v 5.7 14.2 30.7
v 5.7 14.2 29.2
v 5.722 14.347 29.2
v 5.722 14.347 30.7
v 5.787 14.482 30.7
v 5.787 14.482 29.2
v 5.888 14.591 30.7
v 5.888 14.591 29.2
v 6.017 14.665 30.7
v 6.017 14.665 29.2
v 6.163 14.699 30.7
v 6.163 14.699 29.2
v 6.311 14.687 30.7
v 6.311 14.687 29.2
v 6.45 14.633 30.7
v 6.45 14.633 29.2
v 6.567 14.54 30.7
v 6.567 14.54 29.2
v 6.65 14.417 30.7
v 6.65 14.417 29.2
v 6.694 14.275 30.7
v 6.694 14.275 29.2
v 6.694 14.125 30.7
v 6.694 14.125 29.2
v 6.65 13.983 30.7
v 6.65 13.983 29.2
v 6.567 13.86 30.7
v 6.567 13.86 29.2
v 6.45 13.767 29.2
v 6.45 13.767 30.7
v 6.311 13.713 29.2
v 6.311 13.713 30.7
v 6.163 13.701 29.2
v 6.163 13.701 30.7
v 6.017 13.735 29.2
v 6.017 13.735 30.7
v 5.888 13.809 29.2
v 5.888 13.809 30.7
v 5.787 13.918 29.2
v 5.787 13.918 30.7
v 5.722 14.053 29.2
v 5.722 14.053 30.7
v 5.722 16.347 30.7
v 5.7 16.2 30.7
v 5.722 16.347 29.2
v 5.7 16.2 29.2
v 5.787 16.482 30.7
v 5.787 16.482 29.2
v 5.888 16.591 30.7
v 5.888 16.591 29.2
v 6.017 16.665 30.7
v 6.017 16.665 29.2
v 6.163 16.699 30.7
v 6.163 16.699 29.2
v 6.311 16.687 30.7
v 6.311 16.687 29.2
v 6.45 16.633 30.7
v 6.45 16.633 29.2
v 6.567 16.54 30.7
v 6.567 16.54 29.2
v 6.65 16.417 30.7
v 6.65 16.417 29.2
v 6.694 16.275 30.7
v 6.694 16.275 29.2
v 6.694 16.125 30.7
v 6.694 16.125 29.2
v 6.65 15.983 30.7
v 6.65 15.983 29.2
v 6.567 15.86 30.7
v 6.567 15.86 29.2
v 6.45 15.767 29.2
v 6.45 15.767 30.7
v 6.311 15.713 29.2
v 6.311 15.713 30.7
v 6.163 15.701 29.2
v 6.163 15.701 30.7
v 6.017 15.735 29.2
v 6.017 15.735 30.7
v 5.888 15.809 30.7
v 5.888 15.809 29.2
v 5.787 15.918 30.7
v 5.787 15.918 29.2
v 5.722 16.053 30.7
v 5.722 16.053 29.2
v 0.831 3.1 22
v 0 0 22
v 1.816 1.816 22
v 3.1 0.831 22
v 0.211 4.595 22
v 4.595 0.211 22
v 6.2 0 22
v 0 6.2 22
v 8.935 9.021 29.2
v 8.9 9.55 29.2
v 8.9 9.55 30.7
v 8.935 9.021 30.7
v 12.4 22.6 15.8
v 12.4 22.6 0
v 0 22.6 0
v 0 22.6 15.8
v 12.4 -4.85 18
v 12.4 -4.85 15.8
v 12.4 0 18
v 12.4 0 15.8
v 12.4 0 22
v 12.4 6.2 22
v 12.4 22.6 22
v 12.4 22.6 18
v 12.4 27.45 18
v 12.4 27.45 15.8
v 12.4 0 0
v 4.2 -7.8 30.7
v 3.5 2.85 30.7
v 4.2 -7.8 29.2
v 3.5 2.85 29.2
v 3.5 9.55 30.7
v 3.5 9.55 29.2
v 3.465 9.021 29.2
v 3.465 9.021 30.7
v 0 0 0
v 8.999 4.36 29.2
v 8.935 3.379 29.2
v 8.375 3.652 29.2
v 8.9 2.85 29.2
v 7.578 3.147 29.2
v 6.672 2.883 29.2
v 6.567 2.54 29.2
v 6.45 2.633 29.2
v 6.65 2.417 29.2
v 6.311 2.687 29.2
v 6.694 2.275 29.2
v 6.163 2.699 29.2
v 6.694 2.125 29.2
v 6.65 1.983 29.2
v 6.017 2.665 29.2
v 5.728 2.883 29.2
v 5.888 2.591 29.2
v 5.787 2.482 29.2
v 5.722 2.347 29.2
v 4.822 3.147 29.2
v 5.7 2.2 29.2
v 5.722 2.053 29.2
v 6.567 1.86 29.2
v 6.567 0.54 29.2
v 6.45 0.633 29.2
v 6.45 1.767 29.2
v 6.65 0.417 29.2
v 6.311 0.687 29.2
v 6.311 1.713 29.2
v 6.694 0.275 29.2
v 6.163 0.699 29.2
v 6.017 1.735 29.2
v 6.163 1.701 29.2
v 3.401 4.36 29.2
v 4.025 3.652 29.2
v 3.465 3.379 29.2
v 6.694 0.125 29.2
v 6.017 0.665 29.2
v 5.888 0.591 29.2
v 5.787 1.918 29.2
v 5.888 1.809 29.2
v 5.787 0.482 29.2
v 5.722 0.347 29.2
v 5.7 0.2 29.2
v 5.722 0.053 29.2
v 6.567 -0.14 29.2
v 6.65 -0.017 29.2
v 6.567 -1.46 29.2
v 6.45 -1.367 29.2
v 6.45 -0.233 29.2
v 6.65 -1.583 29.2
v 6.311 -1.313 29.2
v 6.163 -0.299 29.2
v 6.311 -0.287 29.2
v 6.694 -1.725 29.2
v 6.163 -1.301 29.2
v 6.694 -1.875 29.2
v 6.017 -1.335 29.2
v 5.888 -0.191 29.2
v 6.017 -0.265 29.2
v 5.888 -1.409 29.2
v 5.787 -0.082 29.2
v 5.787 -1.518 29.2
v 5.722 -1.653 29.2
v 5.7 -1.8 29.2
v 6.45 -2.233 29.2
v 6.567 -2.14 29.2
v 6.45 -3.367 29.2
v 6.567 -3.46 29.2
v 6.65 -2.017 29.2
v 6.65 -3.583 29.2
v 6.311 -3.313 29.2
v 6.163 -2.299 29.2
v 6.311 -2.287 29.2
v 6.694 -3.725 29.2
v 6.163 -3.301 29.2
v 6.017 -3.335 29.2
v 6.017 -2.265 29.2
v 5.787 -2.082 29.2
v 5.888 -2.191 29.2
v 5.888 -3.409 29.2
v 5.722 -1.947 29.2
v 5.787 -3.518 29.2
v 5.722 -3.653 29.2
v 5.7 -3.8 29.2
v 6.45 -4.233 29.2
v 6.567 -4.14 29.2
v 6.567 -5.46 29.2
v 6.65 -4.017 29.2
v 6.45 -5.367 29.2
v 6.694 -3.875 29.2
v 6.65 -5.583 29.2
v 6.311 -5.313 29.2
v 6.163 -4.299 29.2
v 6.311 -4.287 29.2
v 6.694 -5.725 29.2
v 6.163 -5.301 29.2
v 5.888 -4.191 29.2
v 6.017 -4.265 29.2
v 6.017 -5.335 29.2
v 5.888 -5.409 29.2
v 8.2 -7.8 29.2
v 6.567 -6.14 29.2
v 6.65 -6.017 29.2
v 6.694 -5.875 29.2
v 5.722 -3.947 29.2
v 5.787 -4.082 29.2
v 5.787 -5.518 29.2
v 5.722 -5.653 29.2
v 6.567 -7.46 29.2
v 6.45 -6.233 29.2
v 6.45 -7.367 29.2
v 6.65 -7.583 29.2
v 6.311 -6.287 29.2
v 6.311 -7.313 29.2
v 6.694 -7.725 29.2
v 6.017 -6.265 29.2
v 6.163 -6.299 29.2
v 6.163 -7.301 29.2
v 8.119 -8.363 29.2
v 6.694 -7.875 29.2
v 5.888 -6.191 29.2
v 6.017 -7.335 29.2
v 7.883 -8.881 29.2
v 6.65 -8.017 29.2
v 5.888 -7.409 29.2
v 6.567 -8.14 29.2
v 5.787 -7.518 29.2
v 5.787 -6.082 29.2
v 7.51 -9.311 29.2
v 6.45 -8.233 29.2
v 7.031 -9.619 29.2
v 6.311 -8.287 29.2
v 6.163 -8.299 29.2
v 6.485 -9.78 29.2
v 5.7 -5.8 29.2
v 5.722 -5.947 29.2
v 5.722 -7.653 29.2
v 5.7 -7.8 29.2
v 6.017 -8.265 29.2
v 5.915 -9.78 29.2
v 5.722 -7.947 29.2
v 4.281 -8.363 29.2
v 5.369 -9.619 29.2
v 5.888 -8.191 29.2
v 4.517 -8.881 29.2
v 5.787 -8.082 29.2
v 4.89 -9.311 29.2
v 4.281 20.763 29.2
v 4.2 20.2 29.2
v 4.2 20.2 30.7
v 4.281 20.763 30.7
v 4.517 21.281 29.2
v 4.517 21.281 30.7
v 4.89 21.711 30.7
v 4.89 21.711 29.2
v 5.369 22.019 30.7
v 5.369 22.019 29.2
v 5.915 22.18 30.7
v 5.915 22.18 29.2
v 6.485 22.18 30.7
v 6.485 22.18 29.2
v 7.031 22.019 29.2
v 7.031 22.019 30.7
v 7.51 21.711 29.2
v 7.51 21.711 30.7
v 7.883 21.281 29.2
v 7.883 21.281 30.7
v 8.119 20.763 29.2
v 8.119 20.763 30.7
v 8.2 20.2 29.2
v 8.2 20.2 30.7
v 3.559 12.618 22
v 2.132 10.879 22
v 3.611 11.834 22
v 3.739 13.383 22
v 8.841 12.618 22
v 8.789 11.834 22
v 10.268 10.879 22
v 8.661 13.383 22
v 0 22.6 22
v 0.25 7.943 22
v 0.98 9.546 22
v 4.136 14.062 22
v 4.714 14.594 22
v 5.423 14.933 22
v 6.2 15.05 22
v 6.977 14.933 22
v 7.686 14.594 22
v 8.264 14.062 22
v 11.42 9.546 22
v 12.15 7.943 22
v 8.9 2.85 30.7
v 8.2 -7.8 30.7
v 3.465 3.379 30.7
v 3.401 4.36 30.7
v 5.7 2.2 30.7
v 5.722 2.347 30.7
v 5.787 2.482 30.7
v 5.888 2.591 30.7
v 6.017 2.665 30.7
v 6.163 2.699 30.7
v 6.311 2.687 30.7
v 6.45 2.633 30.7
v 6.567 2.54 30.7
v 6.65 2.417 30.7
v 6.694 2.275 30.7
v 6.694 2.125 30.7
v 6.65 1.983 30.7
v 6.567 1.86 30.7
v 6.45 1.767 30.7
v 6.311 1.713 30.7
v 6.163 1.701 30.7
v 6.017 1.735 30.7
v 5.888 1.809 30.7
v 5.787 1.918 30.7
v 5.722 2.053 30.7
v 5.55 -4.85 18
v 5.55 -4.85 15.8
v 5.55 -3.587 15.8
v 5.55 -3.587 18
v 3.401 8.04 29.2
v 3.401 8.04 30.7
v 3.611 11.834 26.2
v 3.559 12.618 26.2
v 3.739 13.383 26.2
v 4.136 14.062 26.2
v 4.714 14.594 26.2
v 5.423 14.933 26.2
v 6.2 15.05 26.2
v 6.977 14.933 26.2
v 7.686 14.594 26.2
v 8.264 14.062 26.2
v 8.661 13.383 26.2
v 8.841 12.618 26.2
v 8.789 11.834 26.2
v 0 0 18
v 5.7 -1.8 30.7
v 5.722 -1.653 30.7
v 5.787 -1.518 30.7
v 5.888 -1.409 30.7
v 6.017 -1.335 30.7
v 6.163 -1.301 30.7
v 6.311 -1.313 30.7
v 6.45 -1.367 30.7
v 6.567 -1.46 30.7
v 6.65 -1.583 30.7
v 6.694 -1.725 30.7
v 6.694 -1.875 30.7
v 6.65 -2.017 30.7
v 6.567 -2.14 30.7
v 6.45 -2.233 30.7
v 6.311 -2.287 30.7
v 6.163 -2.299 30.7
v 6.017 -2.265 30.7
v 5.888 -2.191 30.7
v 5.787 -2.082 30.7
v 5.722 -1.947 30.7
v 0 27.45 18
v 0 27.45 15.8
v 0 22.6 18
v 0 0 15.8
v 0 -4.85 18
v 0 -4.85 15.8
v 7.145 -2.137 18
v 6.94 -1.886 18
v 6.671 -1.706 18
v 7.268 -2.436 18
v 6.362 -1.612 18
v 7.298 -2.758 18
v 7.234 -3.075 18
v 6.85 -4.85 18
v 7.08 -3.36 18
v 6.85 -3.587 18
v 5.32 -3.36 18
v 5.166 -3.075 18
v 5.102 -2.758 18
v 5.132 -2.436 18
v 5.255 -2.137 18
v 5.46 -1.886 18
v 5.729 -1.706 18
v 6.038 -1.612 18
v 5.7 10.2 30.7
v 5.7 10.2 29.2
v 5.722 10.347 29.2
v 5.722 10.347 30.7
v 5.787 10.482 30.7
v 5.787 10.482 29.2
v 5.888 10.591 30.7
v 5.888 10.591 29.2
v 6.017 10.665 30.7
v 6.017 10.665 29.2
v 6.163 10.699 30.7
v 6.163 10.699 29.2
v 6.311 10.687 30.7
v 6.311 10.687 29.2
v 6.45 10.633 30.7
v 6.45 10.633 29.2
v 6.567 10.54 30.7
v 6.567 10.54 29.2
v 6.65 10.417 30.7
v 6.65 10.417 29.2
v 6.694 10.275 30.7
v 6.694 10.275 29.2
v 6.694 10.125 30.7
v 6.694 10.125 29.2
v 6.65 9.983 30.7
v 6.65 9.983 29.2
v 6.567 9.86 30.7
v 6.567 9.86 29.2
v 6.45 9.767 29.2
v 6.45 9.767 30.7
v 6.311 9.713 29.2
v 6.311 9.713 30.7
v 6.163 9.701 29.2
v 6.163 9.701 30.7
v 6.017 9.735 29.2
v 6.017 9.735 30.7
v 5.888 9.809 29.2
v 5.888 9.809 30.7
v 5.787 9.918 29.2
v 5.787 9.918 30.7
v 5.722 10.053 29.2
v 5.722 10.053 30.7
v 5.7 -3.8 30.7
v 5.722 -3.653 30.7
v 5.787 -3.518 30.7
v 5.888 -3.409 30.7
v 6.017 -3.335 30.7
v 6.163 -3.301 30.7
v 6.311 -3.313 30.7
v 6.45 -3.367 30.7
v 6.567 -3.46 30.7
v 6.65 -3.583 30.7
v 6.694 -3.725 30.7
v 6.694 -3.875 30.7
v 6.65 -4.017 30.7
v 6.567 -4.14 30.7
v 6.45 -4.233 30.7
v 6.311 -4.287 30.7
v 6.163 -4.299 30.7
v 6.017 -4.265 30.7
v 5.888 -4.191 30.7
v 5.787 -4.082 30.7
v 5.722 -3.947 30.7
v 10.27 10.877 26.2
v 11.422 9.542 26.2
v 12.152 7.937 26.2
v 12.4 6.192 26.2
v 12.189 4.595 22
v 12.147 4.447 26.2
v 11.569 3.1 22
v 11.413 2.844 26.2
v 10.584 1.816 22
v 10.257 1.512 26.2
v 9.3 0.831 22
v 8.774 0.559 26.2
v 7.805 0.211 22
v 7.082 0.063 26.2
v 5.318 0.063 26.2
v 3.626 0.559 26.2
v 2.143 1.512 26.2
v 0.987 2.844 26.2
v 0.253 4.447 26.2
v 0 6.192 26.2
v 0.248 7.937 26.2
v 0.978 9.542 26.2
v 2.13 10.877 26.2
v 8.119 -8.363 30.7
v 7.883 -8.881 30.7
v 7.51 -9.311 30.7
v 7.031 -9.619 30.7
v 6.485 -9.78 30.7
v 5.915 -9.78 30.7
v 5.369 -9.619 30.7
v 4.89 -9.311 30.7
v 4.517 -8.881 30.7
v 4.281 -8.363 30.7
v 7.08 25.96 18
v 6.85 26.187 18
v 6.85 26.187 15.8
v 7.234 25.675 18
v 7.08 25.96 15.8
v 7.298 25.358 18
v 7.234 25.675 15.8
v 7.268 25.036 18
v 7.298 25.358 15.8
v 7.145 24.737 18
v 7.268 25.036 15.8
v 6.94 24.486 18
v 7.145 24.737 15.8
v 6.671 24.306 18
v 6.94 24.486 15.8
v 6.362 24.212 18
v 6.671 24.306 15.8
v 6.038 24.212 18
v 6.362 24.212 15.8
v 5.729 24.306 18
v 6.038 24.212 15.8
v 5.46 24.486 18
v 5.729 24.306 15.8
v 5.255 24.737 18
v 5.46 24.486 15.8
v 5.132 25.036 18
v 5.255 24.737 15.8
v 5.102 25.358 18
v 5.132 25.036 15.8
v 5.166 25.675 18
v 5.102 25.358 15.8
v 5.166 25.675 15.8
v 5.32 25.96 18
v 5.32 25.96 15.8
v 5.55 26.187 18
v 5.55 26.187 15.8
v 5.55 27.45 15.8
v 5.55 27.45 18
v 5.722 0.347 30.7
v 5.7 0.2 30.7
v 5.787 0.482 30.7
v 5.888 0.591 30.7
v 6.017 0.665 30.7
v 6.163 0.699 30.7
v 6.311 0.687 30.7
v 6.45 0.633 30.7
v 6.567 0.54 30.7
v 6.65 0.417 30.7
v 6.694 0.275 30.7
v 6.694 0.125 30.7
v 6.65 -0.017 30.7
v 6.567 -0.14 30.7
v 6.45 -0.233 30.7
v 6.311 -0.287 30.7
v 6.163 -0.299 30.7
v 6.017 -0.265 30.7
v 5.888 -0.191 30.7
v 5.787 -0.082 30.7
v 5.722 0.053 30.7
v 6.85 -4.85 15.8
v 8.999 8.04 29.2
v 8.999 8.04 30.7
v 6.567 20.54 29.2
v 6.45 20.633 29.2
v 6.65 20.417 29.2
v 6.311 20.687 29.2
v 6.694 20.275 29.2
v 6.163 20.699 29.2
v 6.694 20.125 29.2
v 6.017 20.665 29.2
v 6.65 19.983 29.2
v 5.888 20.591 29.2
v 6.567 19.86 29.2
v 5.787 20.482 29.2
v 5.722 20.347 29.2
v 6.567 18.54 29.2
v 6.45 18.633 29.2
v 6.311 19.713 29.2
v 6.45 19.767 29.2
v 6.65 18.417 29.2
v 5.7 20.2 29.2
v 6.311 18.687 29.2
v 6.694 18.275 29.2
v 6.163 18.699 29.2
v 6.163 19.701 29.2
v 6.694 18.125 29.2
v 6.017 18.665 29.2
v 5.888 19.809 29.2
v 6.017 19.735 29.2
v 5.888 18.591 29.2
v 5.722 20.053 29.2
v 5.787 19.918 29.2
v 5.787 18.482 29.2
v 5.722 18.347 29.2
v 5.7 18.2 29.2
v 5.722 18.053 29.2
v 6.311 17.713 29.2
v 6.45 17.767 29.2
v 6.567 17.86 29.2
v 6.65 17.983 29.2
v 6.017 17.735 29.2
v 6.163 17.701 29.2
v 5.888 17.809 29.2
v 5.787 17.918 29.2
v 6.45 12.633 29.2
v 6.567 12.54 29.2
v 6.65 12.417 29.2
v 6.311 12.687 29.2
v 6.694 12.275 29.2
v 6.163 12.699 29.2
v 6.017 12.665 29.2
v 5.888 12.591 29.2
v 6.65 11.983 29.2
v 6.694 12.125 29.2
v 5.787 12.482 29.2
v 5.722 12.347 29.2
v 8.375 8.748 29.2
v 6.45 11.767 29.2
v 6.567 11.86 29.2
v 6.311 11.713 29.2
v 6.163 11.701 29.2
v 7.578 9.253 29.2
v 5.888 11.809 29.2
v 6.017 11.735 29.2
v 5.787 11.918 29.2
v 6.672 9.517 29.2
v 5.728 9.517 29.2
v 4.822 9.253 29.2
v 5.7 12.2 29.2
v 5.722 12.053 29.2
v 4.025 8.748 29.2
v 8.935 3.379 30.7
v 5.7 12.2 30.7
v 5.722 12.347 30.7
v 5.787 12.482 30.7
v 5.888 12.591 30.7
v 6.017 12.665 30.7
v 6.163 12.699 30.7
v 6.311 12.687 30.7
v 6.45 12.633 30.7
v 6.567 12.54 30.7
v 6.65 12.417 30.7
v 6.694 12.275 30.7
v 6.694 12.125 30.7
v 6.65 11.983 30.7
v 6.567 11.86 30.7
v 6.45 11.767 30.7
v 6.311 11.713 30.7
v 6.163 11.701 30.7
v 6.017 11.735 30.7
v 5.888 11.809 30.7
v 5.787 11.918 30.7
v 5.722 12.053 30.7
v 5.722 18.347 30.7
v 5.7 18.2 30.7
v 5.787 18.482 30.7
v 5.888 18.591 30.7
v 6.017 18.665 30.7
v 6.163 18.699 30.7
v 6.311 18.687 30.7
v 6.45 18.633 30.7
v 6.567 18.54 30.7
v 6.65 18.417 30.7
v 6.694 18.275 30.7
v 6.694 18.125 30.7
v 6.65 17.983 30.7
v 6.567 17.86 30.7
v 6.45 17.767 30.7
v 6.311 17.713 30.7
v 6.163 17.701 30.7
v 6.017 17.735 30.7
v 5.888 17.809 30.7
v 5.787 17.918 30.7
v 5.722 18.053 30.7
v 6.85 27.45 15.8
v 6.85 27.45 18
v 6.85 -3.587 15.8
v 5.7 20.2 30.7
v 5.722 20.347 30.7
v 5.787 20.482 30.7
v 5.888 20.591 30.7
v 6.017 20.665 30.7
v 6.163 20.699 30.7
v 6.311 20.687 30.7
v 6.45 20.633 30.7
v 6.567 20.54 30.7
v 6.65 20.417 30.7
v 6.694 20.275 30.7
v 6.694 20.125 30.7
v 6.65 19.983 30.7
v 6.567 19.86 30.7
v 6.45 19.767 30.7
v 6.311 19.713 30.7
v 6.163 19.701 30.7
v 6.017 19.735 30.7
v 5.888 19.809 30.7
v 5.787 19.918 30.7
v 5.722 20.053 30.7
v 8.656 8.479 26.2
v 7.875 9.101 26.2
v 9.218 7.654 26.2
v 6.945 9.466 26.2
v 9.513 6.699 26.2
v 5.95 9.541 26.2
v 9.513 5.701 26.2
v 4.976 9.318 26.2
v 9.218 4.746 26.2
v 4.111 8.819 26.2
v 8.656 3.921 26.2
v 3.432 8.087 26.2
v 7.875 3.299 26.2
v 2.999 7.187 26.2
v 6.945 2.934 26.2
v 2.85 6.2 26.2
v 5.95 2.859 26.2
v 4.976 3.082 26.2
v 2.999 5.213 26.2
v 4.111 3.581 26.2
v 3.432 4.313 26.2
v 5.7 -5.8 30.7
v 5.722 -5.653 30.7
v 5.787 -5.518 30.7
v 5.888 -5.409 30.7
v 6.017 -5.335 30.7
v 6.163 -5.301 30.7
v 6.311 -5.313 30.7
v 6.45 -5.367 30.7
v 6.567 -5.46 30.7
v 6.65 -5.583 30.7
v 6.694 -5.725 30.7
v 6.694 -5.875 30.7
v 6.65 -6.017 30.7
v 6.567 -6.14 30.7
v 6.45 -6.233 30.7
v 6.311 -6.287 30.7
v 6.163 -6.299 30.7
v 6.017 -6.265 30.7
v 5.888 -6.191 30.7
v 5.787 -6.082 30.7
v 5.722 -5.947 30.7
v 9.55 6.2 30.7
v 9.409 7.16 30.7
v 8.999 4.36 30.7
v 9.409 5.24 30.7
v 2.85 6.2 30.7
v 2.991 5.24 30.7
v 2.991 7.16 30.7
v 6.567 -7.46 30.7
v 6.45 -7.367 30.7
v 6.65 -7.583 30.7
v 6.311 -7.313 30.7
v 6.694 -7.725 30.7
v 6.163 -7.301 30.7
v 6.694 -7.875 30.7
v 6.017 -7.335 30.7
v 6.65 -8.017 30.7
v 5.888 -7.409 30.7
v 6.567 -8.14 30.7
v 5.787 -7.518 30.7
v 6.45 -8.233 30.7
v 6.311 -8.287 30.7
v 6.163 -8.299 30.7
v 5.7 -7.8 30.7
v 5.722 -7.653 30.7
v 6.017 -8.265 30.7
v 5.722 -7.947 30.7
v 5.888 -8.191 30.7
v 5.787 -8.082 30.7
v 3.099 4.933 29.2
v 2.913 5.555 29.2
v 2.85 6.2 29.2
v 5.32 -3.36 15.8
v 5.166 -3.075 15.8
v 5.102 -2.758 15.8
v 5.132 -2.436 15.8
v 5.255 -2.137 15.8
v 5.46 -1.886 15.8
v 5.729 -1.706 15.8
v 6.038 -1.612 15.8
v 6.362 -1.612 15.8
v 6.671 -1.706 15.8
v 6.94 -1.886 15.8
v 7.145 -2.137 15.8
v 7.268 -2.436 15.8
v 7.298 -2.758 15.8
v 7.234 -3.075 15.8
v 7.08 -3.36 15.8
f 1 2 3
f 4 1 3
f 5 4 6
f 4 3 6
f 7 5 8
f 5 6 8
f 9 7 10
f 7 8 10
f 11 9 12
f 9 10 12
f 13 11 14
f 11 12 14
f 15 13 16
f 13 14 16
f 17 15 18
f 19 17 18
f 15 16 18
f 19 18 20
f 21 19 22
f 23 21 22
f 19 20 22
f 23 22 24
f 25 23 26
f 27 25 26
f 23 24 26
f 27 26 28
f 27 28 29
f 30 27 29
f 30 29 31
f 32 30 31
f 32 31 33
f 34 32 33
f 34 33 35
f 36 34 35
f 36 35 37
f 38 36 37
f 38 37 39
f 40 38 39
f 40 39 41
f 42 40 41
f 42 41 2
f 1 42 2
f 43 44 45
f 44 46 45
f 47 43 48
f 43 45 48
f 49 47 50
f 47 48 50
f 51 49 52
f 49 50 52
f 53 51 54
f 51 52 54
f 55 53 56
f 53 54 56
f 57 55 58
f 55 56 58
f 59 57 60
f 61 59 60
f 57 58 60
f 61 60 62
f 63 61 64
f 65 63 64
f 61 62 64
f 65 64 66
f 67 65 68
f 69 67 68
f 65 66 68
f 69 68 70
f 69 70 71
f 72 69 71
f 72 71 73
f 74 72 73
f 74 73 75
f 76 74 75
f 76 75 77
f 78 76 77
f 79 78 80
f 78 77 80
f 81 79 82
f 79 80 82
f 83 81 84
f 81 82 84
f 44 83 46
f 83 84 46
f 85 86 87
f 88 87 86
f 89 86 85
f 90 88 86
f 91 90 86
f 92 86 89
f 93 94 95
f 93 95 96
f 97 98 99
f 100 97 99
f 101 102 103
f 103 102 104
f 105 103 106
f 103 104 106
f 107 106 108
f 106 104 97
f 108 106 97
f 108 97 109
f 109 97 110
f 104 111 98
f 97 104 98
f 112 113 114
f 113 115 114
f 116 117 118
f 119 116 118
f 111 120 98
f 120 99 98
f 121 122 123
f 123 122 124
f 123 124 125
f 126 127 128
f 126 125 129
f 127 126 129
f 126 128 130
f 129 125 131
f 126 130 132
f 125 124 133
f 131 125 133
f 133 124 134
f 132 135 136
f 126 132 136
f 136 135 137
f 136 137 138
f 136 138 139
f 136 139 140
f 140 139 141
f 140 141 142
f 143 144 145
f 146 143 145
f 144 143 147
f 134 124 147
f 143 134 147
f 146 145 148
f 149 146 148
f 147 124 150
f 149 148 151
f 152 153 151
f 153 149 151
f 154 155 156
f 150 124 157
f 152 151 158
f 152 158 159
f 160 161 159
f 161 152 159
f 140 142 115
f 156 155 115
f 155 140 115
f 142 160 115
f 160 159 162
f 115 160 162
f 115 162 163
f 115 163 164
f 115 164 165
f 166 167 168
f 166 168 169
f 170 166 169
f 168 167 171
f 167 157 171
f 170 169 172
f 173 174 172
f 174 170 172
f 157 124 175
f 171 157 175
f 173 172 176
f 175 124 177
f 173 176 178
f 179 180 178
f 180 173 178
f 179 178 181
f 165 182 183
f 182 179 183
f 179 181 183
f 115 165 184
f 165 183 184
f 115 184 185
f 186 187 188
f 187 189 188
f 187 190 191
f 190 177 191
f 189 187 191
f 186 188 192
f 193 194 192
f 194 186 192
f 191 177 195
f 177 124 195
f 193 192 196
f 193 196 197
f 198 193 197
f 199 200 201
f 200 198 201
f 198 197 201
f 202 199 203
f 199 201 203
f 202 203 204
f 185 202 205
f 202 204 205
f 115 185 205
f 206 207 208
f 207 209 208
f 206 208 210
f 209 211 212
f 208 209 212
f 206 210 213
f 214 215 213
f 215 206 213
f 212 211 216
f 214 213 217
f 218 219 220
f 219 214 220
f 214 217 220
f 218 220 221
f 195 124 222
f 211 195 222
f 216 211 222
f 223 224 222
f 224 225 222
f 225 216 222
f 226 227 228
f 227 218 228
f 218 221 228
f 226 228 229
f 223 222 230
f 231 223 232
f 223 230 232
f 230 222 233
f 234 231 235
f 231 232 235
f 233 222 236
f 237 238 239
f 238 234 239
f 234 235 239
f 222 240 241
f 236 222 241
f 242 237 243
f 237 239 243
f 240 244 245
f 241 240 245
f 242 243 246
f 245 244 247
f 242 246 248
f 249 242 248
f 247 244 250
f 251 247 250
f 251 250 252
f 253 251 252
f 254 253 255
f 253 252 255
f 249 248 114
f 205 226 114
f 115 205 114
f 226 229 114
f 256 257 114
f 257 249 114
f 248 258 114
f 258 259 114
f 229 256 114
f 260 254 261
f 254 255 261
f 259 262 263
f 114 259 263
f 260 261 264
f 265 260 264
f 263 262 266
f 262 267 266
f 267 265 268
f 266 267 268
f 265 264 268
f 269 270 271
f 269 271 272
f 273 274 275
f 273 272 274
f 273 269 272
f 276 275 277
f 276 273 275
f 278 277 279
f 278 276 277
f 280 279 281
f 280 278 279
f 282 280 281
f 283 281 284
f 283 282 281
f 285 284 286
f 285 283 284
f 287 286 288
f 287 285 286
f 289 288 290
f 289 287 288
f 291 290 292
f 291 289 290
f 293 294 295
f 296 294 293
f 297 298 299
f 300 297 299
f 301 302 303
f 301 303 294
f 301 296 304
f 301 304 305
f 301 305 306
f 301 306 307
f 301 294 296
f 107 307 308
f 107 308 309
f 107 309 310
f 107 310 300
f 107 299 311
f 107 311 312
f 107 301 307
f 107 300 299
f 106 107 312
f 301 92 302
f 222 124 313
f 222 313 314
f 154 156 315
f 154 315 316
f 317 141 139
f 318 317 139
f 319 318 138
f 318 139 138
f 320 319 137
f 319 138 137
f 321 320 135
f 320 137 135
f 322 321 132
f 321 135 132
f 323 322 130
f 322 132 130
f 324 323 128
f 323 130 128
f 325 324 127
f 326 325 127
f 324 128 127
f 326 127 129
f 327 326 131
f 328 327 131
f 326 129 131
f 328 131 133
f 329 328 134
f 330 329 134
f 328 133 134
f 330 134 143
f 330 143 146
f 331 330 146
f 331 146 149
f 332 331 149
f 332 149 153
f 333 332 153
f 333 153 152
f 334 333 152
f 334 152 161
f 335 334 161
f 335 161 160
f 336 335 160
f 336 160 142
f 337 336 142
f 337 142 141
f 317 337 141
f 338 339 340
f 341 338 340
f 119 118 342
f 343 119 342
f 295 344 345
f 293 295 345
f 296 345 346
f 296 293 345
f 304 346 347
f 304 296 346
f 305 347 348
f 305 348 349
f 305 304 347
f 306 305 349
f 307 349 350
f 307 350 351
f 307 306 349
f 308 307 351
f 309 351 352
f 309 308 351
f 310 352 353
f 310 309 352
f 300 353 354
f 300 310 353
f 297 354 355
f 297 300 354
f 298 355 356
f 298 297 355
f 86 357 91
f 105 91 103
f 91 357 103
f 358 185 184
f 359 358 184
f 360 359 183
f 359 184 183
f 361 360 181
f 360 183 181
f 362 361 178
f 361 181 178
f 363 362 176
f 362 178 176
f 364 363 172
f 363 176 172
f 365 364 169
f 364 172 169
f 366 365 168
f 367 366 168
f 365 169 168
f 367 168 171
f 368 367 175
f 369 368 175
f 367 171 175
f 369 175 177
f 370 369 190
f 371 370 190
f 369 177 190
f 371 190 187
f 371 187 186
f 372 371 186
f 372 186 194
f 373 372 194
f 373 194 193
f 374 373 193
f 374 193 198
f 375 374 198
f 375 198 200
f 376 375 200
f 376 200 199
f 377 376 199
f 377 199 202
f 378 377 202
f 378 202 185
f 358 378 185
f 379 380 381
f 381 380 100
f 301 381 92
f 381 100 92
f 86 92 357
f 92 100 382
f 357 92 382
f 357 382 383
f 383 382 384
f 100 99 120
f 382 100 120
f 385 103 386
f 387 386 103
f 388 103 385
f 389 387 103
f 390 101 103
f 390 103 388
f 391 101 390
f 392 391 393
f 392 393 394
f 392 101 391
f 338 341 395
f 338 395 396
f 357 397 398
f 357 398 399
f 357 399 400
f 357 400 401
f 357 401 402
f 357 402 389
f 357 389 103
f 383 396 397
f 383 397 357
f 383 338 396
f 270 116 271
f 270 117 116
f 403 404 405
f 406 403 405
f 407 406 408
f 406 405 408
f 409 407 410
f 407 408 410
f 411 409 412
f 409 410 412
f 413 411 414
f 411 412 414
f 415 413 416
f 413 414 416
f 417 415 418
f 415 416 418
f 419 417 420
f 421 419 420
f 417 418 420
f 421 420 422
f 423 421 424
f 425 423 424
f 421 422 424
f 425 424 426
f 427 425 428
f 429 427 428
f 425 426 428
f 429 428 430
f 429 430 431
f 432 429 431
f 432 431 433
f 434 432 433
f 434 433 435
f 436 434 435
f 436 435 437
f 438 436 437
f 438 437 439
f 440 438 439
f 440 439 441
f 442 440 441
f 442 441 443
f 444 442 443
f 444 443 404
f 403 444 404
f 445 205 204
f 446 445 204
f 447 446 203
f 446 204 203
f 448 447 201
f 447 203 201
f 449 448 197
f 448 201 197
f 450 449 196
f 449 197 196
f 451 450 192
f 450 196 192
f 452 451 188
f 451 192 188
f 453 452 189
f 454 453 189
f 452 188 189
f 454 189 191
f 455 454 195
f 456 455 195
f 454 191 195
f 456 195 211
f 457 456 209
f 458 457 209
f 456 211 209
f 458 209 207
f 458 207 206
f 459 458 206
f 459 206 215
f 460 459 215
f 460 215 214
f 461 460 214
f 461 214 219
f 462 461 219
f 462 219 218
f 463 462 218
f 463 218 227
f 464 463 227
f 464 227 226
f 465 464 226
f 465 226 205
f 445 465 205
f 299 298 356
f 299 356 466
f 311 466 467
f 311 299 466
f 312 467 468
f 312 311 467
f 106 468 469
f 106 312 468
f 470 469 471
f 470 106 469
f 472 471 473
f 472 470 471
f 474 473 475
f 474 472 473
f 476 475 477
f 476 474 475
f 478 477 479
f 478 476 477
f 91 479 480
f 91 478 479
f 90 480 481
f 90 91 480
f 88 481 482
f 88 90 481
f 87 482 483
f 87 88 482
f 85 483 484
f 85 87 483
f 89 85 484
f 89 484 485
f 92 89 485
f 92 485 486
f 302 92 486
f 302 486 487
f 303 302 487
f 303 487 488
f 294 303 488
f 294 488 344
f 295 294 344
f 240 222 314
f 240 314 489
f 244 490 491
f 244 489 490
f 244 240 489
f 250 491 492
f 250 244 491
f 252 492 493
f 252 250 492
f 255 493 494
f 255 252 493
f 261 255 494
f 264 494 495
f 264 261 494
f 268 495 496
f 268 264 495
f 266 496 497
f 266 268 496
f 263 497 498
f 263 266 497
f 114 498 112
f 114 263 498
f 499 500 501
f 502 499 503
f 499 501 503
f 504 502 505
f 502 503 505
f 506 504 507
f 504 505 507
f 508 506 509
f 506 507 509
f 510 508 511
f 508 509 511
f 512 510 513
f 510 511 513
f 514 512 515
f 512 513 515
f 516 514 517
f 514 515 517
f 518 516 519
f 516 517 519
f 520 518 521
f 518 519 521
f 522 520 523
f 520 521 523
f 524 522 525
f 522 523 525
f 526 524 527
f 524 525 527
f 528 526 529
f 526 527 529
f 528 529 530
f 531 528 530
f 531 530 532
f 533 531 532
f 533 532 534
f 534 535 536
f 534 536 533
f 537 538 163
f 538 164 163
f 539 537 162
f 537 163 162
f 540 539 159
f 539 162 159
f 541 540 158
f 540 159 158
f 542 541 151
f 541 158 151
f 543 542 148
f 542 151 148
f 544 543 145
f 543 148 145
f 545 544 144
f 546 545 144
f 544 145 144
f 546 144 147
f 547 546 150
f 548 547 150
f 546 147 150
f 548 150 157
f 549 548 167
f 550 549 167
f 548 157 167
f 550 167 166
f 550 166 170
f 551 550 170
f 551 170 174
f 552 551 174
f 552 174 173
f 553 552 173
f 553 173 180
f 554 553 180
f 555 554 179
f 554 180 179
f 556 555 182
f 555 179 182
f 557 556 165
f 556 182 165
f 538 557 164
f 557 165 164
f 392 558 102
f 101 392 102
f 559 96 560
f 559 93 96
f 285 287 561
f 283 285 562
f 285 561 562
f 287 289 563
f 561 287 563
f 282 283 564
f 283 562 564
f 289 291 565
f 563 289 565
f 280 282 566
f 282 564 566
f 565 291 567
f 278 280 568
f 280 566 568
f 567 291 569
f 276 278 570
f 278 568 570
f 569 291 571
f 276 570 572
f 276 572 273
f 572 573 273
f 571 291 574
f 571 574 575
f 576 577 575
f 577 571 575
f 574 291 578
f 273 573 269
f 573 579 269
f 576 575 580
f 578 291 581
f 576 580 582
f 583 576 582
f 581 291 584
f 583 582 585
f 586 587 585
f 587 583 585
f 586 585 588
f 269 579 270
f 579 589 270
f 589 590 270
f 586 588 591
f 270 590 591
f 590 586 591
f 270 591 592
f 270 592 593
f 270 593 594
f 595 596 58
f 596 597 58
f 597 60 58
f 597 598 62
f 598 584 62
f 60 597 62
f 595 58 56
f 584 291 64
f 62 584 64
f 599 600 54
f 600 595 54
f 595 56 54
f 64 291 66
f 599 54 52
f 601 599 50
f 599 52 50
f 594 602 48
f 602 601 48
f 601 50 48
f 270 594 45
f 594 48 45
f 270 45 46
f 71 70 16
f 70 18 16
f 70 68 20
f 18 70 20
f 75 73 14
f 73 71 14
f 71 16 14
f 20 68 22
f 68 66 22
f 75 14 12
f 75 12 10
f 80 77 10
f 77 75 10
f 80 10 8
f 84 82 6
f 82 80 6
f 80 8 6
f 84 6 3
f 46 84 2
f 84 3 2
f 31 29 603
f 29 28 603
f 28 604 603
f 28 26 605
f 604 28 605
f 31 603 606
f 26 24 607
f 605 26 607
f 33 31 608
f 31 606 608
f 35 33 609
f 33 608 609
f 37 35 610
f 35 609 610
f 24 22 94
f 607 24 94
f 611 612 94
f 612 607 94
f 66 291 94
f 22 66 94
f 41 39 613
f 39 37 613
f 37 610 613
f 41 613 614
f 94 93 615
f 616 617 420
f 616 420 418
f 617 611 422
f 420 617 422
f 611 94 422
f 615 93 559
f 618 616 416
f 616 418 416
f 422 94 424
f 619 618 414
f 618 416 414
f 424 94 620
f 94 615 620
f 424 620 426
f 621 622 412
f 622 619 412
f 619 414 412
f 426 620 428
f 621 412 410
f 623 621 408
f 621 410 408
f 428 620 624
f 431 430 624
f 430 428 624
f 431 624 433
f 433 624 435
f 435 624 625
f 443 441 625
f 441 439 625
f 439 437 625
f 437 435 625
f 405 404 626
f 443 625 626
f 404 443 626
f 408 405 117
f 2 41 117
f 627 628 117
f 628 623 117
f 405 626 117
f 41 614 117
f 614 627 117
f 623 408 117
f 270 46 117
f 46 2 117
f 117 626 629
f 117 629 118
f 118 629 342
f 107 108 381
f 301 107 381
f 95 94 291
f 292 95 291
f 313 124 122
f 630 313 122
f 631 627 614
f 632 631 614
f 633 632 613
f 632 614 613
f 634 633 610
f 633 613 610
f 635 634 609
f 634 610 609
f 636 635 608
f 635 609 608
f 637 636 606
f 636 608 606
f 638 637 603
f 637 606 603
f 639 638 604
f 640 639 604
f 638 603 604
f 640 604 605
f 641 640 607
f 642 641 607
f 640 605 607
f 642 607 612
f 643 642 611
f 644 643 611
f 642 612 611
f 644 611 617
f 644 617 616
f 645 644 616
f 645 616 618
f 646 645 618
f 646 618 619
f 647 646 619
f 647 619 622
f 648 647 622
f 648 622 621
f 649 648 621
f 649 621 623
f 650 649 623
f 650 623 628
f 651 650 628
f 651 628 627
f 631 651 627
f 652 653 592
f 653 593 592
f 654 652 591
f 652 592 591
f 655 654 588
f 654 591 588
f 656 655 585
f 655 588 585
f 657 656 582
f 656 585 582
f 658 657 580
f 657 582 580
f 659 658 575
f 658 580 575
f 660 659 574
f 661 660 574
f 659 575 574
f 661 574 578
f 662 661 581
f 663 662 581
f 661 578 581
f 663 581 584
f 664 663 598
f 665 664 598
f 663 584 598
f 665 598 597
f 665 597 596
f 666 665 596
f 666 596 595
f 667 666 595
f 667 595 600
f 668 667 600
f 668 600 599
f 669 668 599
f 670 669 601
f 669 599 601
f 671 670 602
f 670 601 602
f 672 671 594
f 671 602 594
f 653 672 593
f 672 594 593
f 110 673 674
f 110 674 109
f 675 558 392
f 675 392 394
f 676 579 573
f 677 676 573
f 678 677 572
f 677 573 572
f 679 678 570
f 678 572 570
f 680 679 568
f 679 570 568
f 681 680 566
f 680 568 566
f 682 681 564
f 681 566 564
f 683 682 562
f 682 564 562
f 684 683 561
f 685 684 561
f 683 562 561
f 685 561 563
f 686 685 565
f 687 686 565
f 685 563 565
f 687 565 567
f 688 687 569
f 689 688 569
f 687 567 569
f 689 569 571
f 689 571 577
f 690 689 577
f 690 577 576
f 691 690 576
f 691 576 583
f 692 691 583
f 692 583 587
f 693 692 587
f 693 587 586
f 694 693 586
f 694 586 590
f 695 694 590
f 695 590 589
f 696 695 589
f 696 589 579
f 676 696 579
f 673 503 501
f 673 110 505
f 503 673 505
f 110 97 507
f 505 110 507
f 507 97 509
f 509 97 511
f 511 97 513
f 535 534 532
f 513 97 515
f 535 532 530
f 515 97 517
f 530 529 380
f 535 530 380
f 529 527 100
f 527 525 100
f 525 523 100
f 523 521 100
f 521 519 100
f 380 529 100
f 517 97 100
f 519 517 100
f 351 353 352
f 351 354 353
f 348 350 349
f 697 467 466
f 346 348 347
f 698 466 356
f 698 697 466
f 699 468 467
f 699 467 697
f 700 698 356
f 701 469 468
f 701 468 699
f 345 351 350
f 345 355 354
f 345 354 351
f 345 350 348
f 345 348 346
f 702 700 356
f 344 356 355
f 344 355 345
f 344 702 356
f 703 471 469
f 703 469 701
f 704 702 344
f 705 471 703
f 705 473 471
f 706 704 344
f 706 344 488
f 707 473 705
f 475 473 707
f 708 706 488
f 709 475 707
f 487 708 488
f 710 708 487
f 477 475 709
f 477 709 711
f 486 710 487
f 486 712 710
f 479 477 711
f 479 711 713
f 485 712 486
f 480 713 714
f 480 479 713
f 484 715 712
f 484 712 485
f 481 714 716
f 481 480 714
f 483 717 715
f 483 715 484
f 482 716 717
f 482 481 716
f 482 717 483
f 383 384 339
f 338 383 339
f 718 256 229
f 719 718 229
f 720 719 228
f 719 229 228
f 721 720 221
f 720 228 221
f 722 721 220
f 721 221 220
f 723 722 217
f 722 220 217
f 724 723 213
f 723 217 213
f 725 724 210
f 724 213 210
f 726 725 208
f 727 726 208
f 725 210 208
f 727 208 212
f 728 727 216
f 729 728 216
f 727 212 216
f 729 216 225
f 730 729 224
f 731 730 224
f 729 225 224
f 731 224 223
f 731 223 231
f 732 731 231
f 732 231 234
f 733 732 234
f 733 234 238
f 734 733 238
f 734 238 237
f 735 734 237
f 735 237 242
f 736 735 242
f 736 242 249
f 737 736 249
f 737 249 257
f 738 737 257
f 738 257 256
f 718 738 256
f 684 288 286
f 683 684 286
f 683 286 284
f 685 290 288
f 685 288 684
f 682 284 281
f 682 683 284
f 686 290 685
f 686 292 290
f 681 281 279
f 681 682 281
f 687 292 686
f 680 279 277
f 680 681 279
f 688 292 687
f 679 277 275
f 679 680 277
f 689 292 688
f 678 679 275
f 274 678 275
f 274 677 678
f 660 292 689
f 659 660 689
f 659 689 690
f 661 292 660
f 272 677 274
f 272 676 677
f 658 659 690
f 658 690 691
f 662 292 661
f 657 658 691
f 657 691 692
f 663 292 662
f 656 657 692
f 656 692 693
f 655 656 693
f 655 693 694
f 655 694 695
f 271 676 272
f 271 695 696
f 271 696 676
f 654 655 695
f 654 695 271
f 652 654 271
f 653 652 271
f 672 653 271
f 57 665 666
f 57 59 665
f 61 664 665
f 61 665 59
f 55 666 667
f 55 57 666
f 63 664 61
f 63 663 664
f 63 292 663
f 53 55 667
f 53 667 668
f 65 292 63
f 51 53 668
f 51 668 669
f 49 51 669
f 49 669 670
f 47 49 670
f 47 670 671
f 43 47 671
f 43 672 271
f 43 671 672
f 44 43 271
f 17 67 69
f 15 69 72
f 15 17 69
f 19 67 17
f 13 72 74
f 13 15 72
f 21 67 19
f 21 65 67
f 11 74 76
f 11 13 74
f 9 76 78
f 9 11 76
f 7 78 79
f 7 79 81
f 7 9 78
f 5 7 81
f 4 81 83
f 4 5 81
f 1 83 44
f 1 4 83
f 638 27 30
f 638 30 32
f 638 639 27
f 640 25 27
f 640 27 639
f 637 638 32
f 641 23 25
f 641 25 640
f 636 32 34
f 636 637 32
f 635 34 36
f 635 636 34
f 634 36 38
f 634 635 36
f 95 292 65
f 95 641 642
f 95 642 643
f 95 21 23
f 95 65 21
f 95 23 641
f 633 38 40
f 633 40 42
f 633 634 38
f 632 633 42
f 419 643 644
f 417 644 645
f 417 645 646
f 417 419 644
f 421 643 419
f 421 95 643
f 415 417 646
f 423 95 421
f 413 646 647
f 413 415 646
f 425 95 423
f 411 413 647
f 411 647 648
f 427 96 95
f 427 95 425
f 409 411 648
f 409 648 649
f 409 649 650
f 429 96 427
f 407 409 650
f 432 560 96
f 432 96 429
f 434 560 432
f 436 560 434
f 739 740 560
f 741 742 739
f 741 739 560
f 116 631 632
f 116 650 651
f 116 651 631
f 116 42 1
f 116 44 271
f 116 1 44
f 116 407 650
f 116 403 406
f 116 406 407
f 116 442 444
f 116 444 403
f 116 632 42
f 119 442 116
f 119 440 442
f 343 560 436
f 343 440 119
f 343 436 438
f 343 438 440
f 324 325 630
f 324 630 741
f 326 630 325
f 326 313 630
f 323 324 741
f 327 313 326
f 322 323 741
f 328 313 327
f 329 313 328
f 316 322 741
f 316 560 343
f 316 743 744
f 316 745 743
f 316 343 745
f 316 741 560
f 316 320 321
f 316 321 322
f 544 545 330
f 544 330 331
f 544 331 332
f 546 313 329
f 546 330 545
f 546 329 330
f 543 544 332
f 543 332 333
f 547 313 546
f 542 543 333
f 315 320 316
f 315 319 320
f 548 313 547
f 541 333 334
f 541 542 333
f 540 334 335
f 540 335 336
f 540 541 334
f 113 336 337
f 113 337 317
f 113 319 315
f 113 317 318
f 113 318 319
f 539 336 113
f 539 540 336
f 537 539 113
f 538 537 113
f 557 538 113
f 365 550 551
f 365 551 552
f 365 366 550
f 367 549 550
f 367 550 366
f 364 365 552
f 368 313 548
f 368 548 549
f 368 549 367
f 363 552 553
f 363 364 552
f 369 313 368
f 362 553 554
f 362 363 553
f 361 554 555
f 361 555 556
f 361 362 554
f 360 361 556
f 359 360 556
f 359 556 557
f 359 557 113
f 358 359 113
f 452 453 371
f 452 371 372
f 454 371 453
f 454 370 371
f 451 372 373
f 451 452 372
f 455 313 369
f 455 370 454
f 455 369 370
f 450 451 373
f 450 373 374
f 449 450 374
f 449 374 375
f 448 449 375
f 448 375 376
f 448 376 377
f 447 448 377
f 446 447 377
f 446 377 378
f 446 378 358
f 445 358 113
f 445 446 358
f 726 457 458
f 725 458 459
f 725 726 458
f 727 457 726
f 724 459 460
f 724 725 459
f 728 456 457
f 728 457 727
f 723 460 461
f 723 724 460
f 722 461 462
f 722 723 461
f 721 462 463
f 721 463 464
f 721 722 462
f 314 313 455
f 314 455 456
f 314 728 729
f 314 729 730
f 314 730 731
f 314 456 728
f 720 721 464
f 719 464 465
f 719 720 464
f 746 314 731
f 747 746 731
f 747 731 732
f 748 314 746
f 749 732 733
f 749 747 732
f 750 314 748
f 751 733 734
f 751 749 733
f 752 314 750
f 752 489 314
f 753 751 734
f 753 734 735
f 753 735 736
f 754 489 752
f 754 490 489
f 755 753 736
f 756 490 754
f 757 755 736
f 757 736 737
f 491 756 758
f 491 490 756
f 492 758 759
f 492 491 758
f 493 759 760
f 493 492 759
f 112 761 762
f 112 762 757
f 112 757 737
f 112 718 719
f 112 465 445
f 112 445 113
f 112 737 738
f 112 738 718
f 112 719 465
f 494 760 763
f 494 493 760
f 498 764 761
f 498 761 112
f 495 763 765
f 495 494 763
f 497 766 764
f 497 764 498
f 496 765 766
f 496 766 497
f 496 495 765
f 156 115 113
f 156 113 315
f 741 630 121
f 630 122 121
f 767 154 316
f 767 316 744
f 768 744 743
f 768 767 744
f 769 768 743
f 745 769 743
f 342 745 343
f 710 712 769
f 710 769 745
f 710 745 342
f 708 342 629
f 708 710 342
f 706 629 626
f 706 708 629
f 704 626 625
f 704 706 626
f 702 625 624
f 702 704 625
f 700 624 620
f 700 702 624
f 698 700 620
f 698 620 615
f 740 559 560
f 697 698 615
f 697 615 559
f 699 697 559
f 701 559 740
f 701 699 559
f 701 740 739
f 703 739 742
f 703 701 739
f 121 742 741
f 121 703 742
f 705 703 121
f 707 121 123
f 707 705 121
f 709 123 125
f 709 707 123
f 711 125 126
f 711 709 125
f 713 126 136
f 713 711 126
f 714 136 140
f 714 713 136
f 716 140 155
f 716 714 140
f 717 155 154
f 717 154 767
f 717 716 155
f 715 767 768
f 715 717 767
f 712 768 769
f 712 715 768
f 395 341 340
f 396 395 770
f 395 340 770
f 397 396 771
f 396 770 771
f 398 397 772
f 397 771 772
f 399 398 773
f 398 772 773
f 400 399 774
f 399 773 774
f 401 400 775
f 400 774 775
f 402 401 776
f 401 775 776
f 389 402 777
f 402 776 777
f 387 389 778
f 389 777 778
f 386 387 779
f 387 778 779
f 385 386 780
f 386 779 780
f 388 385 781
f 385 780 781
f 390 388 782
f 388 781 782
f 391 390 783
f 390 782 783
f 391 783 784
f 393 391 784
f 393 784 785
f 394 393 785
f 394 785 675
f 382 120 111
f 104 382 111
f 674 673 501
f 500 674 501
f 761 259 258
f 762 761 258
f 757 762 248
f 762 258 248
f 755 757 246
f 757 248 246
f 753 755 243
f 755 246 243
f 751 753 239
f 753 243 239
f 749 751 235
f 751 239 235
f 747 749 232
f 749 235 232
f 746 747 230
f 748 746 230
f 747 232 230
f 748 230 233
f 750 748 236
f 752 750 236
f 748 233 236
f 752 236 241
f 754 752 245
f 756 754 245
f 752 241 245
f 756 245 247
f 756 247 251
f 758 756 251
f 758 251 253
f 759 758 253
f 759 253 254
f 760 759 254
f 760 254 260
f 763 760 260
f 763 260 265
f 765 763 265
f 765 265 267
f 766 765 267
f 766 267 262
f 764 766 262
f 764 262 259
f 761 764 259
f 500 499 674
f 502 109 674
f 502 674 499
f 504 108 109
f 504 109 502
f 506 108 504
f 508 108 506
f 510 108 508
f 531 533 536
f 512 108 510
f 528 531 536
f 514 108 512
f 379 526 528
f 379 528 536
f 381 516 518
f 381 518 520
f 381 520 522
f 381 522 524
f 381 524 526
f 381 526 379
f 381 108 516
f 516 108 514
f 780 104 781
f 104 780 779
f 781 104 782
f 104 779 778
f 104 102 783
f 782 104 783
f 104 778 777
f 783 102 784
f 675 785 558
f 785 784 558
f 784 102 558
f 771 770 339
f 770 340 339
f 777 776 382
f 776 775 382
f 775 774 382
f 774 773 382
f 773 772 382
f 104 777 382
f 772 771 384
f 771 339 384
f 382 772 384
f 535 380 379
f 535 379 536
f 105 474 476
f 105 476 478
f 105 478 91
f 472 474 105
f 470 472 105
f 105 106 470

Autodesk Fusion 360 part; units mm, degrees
sketch "Szkic1" plane through (0, 0, 0) normal (0, 0, 1) x (1, 0, 0)
  line L0 (0, 0) -> (12.4, 0)
  line L1 (12.4, 0) -> (12.4, 22.6)
  line L2 (12.4, 22.6) -> (0, 22.6)
  line L3 (0, 22.6) -> (0, 0)
  dimension "d1" = 12.4
  dimension "d2" = 22.6
extrude "Wyciągnięcie proste1" add sketch "Szkic1" along normal blind 15.8
sketch "Szkic2" plane through (0, 0, 15.8) normal (0, 0, 1) x (-1, 0, 0)
  line L0 (0, -22.6) -> (0, 0)
  line L1 (0, 0) -> (-12.4, 0)
  line L2 (-12.4, 0) -> (-12.4, -22.6)
  line L3 (-12.4, -22.6) -> (0, -22.6)
  line L4 (0, 0) -> (0, 4.85)
  line L5 (0, 0) -> (0, -11.3)
  line L6 (0, -11.3) -> (-12.4, -11.3)
  line L7 (0, 4.85) -> (-12.4, 4.85)
  line L8 (-12.4, 4.85) -> (-12.4, 0)
  line L9 (0, 0) -> (-6.2, 0)
  line L10 (-6.2, 0) -> (-6.2, 2.7)
  circle A0 centre (-6.2, 2.7) radius 1.1
  line L11 (-6.2, 2.7) -> (-6.2, 4.85)
  line L12 (-6.2, 4.85) -> (-6.85, 4.85)
  line L13 (-6.85, 4.85) -> (-6.85, 3.5874)
  line L14 (-5.55, 4.85) -> (-5.55, 3.5874)
  line L15 (-6.2, -27.45) -> (-6.85, -27.45)
  line L16 (-6.2, -22.6) -> (-6.2, -25.3)
  line L17 (0, -22.6) -> (0, -27.45)
  line L18 (-12.4, -27.45) -> (-12.4, -22.6)
  line L19 (-6.2, -25.3) -> (-6.2, -27.45)
  line L20 (-6.85, -27.45) -> (-6.85, -26.1874)
  line L21 (0, -27.45) -> (-12.4, -27.45)
  line L22 (-5.55, -27.45) -> (-5.55, -26.1874)
  line L23 (0, -22.6) -> (-6.2, -22.6)
  line L24 (0, 0) -> (0, -22.6)
  circle A1 centre (-6.2, -25.3) radius 1.1
  line L25 (0, -22.6) -> (-12.4, -22.6)
  line L26 (-12.4, -22.6) -> (-12.4, 0)
  line L27 (0, -22.6) -> (0, -11.3)
  point P0 (0, -22.6)
  dimension "d5" = 4.85
  dimension "d6" = 2.7
  dimension "d7" = 2.2
  dimension "d8" = 0.65
extrude "Wyciągnięcie proste2" add sketch "Szkic2" along normal blind 2.2 contours L0 L2 L3 L6 L23 L24 L25 L26 L27 | L3 L16 L17 L21 L22 L23 A1 L25 | L0 L1 L2 L5 L6 L9 L24 L26 | L3 L16 L18 L20 L21 A1 L25 | L1 L4 L7 L9 L10 A0 L14 | L1 L7 L8 L10 A0 L13
extrude "Wyciągnięcie proste3" add sketch "Szkic1" along normal blind 22
sketch "Szkic3" plane through (0, 0, 22) normal (0, 0, 1) x (-1, 0, 0)
  line L0 (0, -22.6) -> (0, 0)
  line L1 (0, 0) -> (-12.4, 0)
  line L2 (-12.4, 0) -> (-12.4, -22.6)
  line L3 (-12.4, -22.6) -> (0, -22.6)
  line L4 (-12.4, 0) -> (-12.4, -12.4)
  line L5 (-12.4, -12.4) -> (-12.4, -12)
  line L6 (0, 0) -> (-1, -1)
  line L7 (-12.4, 0) -> (-12.4, -11.3)
  line L8 (-12.4, -12.4) -> (-8.85, -12.4)
  line L9 (-3.55, -12.4) -> (0, -12.4)
  arc A0 (-3.6112, -11.8337) -> (-8.7888, -11.8337) centre (-6.2, -6.2) ccw
  arc A1 (-8.7888, -11.8337) -> (-3.6112, -11.8337) centre (-6.2, -12.4) ccw
  line L10 (-1, -1) -> (-1.8159, -1.8159)
  line L11 (-10.5841, -10.5841) -> (-12.4, -12.4)
  line L12 (0, -12.4) -> (-1.8159, -10.5841)
  line L13 (-10.5841, -1.8159) -> (-12.4, 0)
  dimension "d13" = 12.4
  dimension "d14" = 11.3
  dimension "d15" = 5.3
extrude "Wyciągnięcie proste4" add sketch "Szkic3" along normal blind 4.2 contours A0 A1
sketch "Szkic4" plane through (0, 0, 26.2) normal (0, 0, 1) x (-1, 0, 0)
  arc A0 (-8.7888, -11.8337) -> (-3.6112, -11.8337) centre (-6.2, -12.4) ccw
  arc A1 (-3.6112, -11.8337) -> (-8.7888, -11.8337) centre (-6.2, -6.2) ccw
  circle A2 centre (-6.2, -6.2) radius 3.35
  dimension "d18" = 6.7
extrude "Wyciągnięcie proste5" add sketch "Szkic4" along normal blind 3 contours A2
sketch "Szkic5" plane through (0, 0, 29.2) normal (0, 0, 1) x (-1, 0, 0)
  circle A0 centre (-6.2, -6.2) radius 3.35
  line L0 (-6.2, -6.2) -> (-6.2, -22.2)
  line L1 (-6.2, -6.2) -> (-6.2, 9.8)
  line L2 (-6.2, -22.2) -> (-6.2, -20.2)
  circle A1 centre (-6.2, -20.2) radius 0.5
  circle A2 centre (-6.2, -18.2) radius 0.5
  circle A3 centre (-6.2, -16.2) radius 0.5
  circle A4 centre (-6.2, -14.2) radius 0.5
  circle A5 centre (-6.2, -12.2) radius 0.5
  circle A6 centre (-6.2, -10.2) radius 0.5
  line L3 (-6.2, -6.2) -> (-9, -6.2)
  circle A7 centre (-6.2, 1.8) radius 0.5
  circle A8 centre (-6.2, -0.2) radius 0.5
  circle A9 centre (-6.2, 5.8) radius 0.5
  circle A10 centre (-6.2, 3.8) radius 0.5
  circle A11 centre (-6.2, -2.2) radius 0.5
  circle A12 centre (-6.2, 7.8) radius 0.5
  circle A13 centre (-6.2, -6.2) radius 3.35
  line L4 (-6.2, -6.2) -> (-6.2, -6.5)
  line L5 (-6.2, -9.55) -> (-8.9, -9.55)
  line L6 (-6.2, -20.2) -> (-8.2, -20.2)
  line L7 (-8.9, -9.55) -> (-8.2, -20.2)
  line L8 (-8.9, -9.55) -> (-8.9348, -9.0209)
  line L9 (-8.9348, -9.0209) -> (-8.9992, -8.0403)
  line L10 (-6.2, -9.55) -> (-3.5, -9.55)
  line L11 (-3.5, -9.55) -> (-4.2, -20.2)
  circle A14 centre (-6.2, -6.2) radius 3.35
  circle A15 centre (-6.2, -6.2) radius 3.35
  line L12 (-3.5, -9.55) -> (-3.4652, -9.0209)
  line L13 (-6.2, -20.2) -> (-4.2, -20.2)
  line L14 (-3.4652, -9.0209) -> (-3.4008, -8.0403)
  arc A16 (-8.2, -20.2) -> (-4.2, -20.2) centre (-6.2, -20.2) ccw
  line L15 (-6.2, 9.8) -> (-6.2, 7.8)
  line L16 (-6.2, -2.85) -> (-8.9, -2.85)
  circle A17 centre (-6.2, 3.8) radius 0.5
  line L17 (-3.5, -2.85) -> (-4.2, 7.8)
  circle A18 centre (-6.2, 1.8) radius 0.5
  line L18 (-6.2, 7.8) -> (-8.2, 7.8)
  circle A19 centre (-6.2, 5.8) radius 0.5
  line L19 (-8.9, -2.85) -> (-8.2, 7.8)
  line L20 (-8.9, -2.85) -> (-8.9348, -3.3791)
  arc A20 (-4.2, 7.8) -> (-8.2, 7.8) centre (-6.2, 7.8) ccw
  line L21 (-6.2, 7.8) -> (-4.2, 7.8)
  circle A21 centre (-6.2, 7.8) radius 0.5
  line L22 (-3.5, -2.85) -> (-3.4652, -3.3791)
  line L23 (-3.4652, -3.3791) -> (-3.4008, -4.3597)
  line L24 (-8.9348, -3.3791) -> (-8.9992, -4.3597)
  line L25 (-6.2, -2.85) -> (-3.5, -2.85)
  circle A22 centre (-6.2, -0.2) radius 0.5
  circle A23 centre (-6.2, -2.2) radius 0.5
  point P0 (-6.2, 7.8)
  dimension "d21" = 16
  dimension "d22" = 16
  dimension "d23" = 2
  dimension "d24" = 1
  dimension "d27" = 0
  dimension "d28" = 10
  dimension "d29" = 6.7
  dimension "d30" = 2.7
  dimension "d31" = 2
extrude "Wyciągnięcie proste6" add sketch "Szkic5" along normal blind 1.5 contours A0 L0 L1 A13 L4 A14 A15 | A0 A13 A14 A15 L22 L23 L25 | A0 A13 L10 A14 A15 L12 L14 | A0 L0 L1 A13 L4 A14 A15 | L1 A7 A8 A9 A10 A11 A12 L16 A17 A18 L18 A19 L19 A21 A22 A23 | A0 A13 A14 A15 L16 L20 L24 | L1 A7 A8 A9 A10 A11 A12 A17 L17 A18 A19 L21 A21 L25 A22 A23 | A0 A13 L5 L8 L9 A14 A15 | L0 A1 A2 A3 A4 A5 A6 L10 L11 L13 | L0 A1 A2 A3 A4 A5 A6 L5 L6 L7 | L1 A12 L15 L18 A20 A21 | L1 A12 L15 A20 L21 A21 | L0 L2 A1 L6 A16 | L0 L2 A1 L13 A16
equation "d5 = ( ( 32.3 - 22.6 ) / 2 ) * 1 mm"
equation "d6 = ( ( 28 - 22.6 ) / 2 ) * 1 mm"
equation "d8 = ( 1.3 / 2 ) * 1 mm"
equation "d30 = ( 5.4 / 2 ) * 1 mm"
